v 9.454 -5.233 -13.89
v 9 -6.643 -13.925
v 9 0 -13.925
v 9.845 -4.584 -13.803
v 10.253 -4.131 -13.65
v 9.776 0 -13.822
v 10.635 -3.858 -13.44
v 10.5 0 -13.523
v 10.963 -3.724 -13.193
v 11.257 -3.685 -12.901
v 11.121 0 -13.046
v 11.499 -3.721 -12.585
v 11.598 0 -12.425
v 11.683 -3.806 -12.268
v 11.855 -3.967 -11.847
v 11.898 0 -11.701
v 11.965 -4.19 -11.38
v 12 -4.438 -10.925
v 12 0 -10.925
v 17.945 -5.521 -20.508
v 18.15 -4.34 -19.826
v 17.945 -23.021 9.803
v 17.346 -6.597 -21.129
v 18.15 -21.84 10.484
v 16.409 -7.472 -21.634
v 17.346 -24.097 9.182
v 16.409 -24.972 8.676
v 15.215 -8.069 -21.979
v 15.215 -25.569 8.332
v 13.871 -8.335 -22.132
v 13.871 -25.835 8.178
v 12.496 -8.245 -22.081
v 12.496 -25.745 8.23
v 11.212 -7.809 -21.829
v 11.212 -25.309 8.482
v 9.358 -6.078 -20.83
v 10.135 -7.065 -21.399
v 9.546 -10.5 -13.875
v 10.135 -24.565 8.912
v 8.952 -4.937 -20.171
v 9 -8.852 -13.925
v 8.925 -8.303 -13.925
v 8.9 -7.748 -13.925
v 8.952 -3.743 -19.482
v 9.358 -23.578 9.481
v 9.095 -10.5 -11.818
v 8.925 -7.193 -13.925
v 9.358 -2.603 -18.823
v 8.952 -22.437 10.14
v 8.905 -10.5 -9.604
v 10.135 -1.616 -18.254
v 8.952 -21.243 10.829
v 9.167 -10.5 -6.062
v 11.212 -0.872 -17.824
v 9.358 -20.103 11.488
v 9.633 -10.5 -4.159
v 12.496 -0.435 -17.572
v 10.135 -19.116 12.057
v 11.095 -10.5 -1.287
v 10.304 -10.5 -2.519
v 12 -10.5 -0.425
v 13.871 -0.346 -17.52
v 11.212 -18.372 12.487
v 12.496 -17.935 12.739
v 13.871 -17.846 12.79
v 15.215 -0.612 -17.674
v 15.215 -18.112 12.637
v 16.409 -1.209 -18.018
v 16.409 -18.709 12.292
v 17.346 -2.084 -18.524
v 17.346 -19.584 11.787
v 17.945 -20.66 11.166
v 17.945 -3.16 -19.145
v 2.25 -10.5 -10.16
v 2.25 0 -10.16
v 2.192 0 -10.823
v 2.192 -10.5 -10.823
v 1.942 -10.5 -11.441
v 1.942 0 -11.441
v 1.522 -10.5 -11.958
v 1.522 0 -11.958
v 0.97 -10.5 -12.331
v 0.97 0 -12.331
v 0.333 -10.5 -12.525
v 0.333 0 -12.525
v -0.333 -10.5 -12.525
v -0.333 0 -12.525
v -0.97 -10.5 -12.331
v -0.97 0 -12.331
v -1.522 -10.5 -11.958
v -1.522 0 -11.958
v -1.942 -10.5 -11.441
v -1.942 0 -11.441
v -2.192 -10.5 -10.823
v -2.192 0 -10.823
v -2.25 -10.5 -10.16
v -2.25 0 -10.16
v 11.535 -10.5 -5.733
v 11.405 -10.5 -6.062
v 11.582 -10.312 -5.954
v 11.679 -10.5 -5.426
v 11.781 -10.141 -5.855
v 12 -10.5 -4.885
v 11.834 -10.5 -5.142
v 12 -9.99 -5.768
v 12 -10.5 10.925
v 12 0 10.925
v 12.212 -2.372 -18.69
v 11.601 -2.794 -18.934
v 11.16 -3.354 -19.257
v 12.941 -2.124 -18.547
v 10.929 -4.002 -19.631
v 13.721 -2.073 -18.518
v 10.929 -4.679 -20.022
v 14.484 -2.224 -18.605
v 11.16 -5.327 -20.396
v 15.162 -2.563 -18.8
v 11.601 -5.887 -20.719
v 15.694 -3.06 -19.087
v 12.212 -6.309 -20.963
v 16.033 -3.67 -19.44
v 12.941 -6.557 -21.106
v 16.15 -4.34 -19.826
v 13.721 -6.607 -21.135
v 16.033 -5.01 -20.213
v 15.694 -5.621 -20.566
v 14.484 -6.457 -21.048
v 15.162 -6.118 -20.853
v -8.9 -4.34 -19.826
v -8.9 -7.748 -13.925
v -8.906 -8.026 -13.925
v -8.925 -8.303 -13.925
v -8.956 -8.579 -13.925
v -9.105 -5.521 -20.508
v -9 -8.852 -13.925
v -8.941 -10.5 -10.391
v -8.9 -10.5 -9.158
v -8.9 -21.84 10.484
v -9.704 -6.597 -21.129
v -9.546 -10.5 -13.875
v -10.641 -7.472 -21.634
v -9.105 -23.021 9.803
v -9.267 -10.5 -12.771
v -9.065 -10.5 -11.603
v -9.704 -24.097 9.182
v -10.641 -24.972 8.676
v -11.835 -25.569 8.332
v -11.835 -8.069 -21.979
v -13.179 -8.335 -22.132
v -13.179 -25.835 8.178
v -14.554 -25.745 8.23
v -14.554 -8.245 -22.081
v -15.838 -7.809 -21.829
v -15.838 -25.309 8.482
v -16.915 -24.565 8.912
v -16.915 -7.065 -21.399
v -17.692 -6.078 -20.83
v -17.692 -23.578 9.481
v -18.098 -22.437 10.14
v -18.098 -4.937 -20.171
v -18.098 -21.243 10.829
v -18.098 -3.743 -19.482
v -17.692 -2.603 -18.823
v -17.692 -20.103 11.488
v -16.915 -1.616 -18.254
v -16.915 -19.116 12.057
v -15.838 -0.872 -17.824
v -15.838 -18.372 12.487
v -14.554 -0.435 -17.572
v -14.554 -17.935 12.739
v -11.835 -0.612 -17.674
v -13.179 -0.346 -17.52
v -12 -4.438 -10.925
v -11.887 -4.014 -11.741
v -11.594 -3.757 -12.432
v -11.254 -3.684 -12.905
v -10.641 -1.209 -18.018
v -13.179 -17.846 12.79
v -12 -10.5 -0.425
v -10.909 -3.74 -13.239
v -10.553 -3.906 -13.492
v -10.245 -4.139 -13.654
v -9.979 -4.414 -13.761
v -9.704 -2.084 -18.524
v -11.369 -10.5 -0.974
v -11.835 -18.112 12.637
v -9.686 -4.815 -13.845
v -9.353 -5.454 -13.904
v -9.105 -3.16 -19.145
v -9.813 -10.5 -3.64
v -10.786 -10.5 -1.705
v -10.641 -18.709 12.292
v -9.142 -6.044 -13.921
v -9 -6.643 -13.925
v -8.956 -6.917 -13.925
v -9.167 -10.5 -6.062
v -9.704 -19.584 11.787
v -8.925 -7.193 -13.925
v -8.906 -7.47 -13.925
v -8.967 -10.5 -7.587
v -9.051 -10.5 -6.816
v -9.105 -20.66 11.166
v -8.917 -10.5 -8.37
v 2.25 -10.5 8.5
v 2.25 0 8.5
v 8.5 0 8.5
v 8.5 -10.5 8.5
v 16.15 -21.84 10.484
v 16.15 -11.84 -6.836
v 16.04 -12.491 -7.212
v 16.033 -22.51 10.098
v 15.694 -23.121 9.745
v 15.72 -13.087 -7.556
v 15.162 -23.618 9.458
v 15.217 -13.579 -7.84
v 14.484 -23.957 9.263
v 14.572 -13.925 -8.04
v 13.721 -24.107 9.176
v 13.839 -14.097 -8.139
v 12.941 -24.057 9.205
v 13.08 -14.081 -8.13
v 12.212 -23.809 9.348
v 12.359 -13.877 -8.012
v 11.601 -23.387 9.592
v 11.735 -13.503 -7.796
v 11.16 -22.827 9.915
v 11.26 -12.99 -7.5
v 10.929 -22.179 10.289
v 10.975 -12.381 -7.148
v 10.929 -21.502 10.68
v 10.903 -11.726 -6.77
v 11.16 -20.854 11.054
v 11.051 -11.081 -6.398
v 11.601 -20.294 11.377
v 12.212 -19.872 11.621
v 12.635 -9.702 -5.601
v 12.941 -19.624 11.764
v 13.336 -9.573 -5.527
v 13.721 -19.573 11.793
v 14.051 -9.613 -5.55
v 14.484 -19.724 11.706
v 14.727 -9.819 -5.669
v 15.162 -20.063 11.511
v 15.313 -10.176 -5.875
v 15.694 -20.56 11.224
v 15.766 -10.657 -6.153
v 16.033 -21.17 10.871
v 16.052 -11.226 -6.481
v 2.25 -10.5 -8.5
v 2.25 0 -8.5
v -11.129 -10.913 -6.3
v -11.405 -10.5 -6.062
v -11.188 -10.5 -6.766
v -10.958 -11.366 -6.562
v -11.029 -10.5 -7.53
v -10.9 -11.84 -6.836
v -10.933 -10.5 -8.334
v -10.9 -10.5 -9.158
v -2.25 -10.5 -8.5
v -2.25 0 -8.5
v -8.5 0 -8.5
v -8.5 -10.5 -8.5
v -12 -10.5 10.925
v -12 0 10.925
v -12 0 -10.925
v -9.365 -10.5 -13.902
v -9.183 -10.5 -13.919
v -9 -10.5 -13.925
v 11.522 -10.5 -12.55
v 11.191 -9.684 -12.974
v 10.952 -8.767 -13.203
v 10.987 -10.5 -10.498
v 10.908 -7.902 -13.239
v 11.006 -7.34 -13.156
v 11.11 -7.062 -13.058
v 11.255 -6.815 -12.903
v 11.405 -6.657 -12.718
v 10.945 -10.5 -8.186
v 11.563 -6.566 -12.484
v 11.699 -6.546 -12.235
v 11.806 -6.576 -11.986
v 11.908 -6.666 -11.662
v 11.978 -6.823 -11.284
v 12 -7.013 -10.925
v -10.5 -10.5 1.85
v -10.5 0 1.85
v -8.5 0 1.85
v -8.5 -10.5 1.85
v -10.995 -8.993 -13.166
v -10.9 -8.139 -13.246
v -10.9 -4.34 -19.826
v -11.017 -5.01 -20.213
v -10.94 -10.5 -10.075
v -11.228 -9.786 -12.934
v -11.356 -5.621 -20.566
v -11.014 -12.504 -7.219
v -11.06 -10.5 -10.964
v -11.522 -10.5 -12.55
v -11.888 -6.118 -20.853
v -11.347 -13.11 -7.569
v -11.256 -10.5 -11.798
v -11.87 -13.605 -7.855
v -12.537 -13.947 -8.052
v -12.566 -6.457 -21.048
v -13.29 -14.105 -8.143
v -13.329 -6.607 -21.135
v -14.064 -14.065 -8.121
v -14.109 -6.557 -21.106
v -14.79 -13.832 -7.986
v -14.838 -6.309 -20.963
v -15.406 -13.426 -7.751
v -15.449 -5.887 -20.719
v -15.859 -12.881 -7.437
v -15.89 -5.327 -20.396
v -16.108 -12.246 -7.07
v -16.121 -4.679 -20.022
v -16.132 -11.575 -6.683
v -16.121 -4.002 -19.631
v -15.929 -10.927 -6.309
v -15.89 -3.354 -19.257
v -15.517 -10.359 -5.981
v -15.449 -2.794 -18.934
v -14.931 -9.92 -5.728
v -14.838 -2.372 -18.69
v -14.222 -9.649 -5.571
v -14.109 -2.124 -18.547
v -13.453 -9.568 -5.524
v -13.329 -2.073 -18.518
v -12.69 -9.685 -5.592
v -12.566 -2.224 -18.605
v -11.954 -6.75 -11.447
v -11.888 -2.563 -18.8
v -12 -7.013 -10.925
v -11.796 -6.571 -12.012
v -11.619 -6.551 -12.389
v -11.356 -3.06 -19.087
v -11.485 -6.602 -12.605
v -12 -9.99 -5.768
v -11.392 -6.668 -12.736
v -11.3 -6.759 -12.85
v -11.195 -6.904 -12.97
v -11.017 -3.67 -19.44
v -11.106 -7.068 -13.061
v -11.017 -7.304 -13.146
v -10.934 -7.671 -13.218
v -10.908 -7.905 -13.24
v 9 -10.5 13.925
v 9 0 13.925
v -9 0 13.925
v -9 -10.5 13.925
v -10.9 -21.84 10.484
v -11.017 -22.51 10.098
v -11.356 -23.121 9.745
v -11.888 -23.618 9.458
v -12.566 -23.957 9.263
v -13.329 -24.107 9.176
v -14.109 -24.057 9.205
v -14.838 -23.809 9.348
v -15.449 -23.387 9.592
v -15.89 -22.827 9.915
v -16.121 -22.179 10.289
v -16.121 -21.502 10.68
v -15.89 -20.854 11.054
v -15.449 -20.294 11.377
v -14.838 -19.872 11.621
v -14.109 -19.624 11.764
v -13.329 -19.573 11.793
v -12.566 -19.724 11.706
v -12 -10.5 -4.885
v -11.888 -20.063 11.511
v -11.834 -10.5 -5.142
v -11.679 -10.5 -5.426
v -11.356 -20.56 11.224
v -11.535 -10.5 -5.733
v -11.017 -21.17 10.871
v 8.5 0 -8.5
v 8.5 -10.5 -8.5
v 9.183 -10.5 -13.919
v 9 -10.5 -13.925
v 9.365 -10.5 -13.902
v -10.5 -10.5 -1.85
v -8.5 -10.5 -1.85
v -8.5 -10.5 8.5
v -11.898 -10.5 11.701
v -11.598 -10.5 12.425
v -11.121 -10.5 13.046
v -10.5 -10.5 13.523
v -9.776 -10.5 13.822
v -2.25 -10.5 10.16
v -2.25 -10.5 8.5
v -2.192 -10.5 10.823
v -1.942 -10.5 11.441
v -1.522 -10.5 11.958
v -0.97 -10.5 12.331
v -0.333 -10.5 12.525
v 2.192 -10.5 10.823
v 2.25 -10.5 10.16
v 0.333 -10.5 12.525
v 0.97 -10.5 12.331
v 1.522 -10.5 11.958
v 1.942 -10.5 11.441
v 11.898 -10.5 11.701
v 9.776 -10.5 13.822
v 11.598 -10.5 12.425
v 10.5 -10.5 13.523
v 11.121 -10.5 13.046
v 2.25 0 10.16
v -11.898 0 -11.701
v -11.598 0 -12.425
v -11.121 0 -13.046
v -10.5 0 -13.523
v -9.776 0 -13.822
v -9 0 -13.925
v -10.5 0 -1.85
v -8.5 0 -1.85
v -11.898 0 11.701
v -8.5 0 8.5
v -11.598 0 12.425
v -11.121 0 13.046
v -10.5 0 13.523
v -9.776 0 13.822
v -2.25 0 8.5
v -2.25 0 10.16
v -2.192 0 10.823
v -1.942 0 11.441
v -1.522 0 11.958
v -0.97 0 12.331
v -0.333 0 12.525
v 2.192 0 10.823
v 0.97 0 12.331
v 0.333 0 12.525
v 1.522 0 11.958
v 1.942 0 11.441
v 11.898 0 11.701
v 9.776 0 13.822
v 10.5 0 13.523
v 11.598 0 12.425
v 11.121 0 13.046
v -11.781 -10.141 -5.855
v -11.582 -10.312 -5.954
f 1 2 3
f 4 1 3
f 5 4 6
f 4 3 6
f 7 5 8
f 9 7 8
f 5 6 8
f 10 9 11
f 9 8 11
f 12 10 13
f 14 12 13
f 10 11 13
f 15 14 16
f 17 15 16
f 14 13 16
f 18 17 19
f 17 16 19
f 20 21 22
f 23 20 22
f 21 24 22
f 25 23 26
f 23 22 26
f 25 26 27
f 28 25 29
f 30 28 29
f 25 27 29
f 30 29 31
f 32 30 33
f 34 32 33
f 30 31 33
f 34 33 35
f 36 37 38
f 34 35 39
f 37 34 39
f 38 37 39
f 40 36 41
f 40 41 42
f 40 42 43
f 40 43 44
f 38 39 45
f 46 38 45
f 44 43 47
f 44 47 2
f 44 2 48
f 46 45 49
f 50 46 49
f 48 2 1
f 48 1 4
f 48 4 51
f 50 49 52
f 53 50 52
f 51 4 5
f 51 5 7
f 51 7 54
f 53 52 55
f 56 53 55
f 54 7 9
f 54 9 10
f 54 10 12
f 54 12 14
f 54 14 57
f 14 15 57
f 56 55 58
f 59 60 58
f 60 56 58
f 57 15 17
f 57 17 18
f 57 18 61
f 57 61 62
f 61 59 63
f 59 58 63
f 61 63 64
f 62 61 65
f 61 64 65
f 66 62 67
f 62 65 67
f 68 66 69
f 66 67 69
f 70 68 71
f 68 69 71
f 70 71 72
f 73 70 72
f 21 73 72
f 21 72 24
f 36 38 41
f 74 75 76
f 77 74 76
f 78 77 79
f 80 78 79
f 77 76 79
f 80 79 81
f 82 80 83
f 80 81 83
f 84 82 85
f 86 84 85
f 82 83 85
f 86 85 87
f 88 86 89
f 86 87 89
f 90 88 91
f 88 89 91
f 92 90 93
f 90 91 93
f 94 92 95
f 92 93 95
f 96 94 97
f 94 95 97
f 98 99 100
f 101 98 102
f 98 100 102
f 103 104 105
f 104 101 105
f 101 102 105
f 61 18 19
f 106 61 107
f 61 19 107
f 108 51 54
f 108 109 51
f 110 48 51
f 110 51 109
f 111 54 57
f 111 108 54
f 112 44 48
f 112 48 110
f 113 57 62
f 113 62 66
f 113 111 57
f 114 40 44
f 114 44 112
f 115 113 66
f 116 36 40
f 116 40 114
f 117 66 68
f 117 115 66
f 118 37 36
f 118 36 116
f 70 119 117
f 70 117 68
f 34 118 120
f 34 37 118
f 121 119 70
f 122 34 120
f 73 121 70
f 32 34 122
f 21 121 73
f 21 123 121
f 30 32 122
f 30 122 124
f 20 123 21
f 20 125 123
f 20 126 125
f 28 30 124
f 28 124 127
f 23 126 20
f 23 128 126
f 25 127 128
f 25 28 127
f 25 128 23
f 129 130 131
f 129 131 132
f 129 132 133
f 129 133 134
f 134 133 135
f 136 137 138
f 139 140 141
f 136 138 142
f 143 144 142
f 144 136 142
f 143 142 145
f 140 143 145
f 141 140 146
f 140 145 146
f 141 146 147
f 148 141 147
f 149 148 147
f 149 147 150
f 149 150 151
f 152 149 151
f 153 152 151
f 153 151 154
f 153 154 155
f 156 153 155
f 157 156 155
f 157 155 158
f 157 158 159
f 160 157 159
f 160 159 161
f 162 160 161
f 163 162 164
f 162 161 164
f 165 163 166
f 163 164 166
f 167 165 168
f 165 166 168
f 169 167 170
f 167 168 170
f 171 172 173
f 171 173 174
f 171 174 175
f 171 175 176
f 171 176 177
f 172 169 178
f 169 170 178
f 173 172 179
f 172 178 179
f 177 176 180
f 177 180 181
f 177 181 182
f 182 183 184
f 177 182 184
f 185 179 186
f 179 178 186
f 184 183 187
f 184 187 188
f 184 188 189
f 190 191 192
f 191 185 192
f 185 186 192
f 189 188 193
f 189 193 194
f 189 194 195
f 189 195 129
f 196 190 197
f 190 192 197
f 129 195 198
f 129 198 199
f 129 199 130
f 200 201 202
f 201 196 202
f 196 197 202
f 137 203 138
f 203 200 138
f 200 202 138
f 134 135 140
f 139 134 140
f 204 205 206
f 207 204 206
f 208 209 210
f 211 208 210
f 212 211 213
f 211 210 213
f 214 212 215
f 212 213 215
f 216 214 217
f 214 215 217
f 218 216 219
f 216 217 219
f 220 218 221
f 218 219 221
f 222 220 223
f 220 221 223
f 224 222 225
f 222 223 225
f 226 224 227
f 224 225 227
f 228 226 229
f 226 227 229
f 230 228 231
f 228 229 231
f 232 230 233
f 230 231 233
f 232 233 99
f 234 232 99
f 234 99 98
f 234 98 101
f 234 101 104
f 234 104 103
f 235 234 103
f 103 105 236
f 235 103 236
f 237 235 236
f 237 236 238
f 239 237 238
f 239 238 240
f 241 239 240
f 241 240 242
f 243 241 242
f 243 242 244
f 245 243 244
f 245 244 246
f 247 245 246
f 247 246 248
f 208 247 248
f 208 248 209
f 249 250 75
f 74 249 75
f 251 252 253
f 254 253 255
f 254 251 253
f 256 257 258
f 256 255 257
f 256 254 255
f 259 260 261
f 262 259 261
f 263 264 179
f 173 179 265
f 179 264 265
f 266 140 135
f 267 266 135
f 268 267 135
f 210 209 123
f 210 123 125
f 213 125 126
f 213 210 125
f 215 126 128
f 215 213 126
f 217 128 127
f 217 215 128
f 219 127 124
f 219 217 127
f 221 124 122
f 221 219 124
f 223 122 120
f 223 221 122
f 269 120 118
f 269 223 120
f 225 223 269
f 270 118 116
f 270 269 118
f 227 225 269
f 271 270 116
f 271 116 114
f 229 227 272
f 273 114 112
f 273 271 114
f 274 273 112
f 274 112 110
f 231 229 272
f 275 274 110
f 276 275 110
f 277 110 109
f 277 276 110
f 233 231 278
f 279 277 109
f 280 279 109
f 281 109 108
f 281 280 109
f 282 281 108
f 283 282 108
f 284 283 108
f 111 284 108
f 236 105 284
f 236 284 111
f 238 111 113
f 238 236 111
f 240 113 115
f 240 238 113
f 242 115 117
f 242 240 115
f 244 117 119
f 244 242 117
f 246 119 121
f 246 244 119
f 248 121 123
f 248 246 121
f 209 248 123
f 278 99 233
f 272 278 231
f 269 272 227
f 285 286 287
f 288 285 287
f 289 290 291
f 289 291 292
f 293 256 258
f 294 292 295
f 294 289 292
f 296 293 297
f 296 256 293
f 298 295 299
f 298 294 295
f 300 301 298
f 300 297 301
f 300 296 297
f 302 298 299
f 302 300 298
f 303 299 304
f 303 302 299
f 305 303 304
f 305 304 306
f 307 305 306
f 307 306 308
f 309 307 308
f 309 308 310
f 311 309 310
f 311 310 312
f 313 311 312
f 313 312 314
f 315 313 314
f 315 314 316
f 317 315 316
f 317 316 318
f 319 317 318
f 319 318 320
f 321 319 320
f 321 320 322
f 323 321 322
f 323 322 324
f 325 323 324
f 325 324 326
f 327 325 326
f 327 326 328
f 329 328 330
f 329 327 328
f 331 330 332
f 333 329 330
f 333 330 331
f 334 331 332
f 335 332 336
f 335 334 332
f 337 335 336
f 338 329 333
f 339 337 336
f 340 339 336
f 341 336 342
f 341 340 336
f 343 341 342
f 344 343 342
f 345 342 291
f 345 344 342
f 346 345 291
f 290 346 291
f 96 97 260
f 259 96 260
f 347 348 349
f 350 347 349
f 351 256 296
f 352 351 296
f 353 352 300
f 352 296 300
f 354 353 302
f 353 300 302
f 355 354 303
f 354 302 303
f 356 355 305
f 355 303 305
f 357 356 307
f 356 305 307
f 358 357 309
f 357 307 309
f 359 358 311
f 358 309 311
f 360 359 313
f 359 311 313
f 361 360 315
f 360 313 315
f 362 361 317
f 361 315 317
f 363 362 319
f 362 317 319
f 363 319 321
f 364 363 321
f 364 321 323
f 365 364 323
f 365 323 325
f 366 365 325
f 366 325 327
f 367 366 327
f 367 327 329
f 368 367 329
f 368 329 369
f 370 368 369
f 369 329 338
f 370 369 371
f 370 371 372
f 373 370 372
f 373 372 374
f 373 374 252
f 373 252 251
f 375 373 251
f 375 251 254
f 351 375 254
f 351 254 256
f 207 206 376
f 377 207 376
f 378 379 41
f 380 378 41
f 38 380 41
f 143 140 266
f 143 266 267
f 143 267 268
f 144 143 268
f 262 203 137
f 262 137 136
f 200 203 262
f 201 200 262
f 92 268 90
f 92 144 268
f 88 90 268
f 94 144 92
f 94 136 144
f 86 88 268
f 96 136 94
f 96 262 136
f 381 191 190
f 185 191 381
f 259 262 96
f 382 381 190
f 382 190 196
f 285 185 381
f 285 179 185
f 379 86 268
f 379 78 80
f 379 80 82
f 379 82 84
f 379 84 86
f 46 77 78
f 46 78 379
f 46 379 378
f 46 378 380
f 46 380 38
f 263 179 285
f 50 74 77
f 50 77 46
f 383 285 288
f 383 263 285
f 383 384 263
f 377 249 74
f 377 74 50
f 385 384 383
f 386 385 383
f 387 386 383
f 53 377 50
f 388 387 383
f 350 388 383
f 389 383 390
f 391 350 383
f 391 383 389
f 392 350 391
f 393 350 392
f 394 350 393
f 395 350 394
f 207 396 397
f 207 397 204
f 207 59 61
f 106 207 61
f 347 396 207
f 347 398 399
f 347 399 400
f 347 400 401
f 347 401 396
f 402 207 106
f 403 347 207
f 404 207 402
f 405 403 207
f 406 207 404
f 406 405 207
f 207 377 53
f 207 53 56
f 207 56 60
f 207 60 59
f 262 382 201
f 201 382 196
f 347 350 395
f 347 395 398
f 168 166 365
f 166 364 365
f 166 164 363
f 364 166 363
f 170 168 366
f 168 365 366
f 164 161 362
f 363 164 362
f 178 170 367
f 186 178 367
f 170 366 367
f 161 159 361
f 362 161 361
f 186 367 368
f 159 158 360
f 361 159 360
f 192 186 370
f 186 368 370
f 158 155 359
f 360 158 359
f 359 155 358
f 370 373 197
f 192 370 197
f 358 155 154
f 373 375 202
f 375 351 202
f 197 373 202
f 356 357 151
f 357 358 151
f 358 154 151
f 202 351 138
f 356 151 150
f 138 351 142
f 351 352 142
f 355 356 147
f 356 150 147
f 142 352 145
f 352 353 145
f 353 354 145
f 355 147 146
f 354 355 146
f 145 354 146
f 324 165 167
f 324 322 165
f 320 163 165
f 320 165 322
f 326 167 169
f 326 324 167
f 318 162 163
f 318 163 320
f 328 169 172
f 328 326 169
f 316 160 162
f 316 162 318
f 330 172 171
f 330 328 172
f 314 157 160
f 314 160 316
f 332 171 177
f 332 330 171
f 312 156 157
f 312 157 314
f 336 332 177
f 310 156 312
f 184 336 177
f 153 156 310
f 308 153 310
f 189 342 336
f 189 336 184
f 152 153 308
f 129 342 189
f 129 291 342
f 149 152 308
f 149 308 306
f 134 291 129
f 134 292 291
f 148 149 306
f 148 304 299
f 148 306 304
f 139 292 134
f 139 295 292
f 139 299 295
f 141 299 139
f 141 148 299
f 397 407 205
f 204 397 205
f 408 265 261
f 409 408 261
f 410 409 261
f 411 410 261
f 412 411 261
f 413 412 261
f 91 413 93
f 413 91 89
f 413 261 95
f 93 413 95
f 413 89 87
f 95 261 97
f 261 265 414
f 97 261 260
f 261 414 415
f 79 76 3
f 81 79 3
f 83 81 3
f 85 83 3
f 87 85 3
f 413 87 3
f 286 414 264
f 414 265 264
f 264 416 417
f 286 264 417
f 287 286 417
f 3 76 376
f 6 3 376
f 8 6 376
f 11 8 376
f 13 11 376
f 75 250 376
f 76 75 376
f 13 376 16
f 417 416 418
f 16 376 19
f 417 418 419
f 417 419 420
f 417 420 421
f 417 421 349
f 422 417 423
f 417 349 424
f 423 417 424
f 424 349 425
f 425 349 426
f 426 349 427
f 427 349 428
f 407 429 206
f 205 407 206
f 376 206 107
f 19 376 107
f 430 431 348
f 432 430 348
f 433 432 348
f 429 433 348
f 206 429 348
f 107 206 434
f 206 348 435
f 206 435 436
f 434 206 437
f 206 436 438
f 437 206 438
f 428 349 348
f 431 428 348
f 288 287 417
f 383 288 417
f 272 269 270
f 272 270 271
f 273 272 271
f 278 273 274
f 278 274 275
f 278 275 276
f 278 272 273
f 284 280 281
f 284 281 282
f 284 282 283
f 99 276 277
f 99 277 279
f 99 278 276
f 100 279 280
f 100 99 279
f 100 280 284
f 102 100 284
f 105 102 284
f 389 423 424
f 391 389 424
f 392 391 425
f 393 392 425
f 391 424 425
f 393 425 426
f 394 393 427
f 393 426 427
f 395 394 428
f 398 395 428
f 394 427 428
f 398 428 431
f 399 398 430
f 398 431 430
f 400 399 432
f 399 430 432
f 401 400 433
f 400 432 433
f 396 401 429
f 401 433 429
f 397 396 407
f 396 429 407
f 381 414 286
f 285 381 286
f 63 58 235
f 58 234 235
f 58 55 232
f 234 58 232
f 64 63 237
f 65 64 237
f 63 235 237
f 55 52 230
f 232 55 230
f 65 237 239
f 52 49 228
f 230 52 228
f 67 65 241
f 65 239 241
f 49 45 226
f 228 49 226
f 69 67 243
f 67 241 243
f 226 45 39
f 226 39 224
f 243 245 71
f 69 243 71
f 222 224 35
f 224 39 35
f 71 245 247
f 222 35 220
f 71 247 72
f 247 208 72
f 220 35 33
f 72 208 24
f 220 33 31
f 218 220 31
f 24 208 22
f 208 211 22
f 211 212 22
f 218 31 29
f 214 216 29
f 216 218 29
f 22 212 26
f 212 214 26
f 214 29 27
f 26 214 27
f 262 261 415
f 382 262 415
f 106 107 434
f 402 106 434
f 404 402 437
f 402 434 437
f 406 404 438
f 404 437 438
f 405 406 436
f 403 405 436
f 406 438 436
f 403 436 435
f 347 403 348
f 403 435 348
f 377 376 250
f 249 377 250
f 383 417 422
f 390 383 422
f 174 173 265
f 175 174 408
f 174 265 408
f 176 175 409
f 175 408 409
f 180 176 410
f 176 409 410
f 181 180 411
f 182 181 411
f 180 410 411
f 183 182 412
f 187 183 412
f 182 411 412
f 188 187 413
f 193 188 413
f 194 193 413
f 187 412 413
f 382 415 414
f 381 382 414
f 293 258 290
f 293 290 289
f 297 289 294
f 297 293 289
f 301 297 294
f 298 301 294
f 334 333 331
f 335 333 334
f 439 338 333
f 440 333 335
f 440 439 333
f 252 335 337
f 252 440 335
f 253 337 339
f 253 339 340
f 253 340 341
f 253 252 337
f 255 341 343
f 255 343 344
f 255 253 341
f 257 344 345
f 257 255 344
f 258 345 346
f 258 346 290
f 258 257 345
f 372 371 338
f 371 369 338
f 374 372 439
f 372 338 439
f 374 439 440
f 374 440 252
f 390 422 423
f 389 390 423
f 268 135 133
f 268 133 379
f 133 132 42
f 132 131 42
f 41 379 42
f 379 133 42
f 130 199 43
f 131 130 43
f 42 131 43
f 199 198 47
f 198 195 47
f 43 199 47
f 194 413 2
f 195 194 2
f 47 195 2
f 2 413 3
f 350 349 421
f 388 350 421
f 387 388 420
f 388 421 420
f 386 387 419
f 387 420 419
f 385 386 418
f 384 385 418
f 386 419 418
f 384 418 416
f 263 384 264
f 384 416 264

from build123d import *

# Parameters (mm, degrees)
F1_DEPTH      = 10.5
F4_R          = 4.625
F4_R_2        = 2.625
F5_DEPTH      = 20
F5_DEPTH_BACK = 15
F6_DEPTH      = 19.1738930562
F6_DEPTH_BACK = 25


with BuildPart() as f1:
    # F0 (on Front) → F1 (new body)
    with BuildSketch(Plane.XZ):
        with BuildLine():
            ThreePointArc((12, 10.924703002), (11.1213203436, 13.0460233455), (9, 13.924703002))
            Line((9, 13.924703002), (-9, 13.924703002))
            ThreePointArc((-9, 13.924703002), (-11.1213203436, 13.0460233455), (-12, 10.924703002))
            Line((-12, 10.924703002), (-12, -10.924703002))
            ThreePointArc((-12, -10.924703002), (-11.1213203436, -13.0460233455), (-9, -13.924703002))
            Line((-9, -13.924703002), (9, -13.924703002))
            ThreePointArc((9, -13.924703002), (11.1213203436, -13.0460233455), (12, -10.924703002))
            Line((12, -10.924703002), (12, 10.924703002))
        make_face()
        with BuildLine():
            Line((8.5, 8.5), (8.5, -8.5))
            Line((8.5, -8.5), (2.25, -8.5))
            Line((2.25, -8.5), (2.25, -10.1598765432))
            ThreePointArc((2.25, -10.1598765432), (0, -12.55), (-2.25, -10.1598765432))
            Line((-2.25, -10.1598765432), (-2.25, -8.5))
            Line((-2.25, -8.5), (-8.5, -8.5))
            Line((-8.5, -8.5), (-8.5, -1.85))
            Line((-8.5, -1.85), (-10.5, -1.85))
            Line((-10.5, -1.85), (-10.5, 1.85))
            Line((-10.5, 1.85), (-8.5, 1.85))
            Line((-8.5, 1.85), (-8.5, 8.5))
            Line((-8.5, 8.5), (-2.25, 8.5))
            Line((-2.25, 8.5), (-2.25, 10.1598765432))
            ThreePointArc((-2.25, 10.1598765432), (0, 12.55), (2.25, 10.1598765432))
            Line((2.25, 10.1598765432), (2.25, 8.5))
            Line((2.25, 8.5), (8.5, 8.5))
        make_face(mode=Mode.SUBTRACT)
    extrude(amount=F1_DEPTH)

    # F4 (on face) → F5 (join, two sides)
    with BuildSketch(Plane(origin=(0, 0, 0), x_dir=(1, 0, 0), z_dir=(0, 0.5, -0.8660254038))) as f5_sk:
        with Locations((13.525, 13.6721374395)):
            Circle(F4_R)
        with Locations((13.525, 13.6721374395)):
            Circle(F4_R_2, mode=Mode.SUBTRACT)
        with Locations((-13.525, 13.6721374395)):
            Circle(F4_R)
        with Locations((-13.525, 13.6721374395)):
            Circle(F4_R_2, mode=Mode.SUBTRACT)
    extrude(amount=-F5_DEPTH)
    extrude(f5_sk.sketch, amount=F5_DEPTH_BACK)

    # F4 (on face) → F6 (cut, two sides)
    with BuildSketch(Plane(origin=(0, 0, 0), x_dir=(1, 0, 0), z_dir=(0, 0.5, -0.8660254038))) as f6_sk:
        with Locations((-13.525, 13.6721374395)):
            Circle(F4_R_2)
        with Locations((13.525, 13.6721374395)):
            Circle(F4_R_2)
    extrude(amount=F6_DEPTH, mode=Mode.SUBTRACT)
    extrude(f6_sk.sketch, amount=-F6_DEPTH_BACK, mode=Mode.SUBTRACT)


solid = f1.part
